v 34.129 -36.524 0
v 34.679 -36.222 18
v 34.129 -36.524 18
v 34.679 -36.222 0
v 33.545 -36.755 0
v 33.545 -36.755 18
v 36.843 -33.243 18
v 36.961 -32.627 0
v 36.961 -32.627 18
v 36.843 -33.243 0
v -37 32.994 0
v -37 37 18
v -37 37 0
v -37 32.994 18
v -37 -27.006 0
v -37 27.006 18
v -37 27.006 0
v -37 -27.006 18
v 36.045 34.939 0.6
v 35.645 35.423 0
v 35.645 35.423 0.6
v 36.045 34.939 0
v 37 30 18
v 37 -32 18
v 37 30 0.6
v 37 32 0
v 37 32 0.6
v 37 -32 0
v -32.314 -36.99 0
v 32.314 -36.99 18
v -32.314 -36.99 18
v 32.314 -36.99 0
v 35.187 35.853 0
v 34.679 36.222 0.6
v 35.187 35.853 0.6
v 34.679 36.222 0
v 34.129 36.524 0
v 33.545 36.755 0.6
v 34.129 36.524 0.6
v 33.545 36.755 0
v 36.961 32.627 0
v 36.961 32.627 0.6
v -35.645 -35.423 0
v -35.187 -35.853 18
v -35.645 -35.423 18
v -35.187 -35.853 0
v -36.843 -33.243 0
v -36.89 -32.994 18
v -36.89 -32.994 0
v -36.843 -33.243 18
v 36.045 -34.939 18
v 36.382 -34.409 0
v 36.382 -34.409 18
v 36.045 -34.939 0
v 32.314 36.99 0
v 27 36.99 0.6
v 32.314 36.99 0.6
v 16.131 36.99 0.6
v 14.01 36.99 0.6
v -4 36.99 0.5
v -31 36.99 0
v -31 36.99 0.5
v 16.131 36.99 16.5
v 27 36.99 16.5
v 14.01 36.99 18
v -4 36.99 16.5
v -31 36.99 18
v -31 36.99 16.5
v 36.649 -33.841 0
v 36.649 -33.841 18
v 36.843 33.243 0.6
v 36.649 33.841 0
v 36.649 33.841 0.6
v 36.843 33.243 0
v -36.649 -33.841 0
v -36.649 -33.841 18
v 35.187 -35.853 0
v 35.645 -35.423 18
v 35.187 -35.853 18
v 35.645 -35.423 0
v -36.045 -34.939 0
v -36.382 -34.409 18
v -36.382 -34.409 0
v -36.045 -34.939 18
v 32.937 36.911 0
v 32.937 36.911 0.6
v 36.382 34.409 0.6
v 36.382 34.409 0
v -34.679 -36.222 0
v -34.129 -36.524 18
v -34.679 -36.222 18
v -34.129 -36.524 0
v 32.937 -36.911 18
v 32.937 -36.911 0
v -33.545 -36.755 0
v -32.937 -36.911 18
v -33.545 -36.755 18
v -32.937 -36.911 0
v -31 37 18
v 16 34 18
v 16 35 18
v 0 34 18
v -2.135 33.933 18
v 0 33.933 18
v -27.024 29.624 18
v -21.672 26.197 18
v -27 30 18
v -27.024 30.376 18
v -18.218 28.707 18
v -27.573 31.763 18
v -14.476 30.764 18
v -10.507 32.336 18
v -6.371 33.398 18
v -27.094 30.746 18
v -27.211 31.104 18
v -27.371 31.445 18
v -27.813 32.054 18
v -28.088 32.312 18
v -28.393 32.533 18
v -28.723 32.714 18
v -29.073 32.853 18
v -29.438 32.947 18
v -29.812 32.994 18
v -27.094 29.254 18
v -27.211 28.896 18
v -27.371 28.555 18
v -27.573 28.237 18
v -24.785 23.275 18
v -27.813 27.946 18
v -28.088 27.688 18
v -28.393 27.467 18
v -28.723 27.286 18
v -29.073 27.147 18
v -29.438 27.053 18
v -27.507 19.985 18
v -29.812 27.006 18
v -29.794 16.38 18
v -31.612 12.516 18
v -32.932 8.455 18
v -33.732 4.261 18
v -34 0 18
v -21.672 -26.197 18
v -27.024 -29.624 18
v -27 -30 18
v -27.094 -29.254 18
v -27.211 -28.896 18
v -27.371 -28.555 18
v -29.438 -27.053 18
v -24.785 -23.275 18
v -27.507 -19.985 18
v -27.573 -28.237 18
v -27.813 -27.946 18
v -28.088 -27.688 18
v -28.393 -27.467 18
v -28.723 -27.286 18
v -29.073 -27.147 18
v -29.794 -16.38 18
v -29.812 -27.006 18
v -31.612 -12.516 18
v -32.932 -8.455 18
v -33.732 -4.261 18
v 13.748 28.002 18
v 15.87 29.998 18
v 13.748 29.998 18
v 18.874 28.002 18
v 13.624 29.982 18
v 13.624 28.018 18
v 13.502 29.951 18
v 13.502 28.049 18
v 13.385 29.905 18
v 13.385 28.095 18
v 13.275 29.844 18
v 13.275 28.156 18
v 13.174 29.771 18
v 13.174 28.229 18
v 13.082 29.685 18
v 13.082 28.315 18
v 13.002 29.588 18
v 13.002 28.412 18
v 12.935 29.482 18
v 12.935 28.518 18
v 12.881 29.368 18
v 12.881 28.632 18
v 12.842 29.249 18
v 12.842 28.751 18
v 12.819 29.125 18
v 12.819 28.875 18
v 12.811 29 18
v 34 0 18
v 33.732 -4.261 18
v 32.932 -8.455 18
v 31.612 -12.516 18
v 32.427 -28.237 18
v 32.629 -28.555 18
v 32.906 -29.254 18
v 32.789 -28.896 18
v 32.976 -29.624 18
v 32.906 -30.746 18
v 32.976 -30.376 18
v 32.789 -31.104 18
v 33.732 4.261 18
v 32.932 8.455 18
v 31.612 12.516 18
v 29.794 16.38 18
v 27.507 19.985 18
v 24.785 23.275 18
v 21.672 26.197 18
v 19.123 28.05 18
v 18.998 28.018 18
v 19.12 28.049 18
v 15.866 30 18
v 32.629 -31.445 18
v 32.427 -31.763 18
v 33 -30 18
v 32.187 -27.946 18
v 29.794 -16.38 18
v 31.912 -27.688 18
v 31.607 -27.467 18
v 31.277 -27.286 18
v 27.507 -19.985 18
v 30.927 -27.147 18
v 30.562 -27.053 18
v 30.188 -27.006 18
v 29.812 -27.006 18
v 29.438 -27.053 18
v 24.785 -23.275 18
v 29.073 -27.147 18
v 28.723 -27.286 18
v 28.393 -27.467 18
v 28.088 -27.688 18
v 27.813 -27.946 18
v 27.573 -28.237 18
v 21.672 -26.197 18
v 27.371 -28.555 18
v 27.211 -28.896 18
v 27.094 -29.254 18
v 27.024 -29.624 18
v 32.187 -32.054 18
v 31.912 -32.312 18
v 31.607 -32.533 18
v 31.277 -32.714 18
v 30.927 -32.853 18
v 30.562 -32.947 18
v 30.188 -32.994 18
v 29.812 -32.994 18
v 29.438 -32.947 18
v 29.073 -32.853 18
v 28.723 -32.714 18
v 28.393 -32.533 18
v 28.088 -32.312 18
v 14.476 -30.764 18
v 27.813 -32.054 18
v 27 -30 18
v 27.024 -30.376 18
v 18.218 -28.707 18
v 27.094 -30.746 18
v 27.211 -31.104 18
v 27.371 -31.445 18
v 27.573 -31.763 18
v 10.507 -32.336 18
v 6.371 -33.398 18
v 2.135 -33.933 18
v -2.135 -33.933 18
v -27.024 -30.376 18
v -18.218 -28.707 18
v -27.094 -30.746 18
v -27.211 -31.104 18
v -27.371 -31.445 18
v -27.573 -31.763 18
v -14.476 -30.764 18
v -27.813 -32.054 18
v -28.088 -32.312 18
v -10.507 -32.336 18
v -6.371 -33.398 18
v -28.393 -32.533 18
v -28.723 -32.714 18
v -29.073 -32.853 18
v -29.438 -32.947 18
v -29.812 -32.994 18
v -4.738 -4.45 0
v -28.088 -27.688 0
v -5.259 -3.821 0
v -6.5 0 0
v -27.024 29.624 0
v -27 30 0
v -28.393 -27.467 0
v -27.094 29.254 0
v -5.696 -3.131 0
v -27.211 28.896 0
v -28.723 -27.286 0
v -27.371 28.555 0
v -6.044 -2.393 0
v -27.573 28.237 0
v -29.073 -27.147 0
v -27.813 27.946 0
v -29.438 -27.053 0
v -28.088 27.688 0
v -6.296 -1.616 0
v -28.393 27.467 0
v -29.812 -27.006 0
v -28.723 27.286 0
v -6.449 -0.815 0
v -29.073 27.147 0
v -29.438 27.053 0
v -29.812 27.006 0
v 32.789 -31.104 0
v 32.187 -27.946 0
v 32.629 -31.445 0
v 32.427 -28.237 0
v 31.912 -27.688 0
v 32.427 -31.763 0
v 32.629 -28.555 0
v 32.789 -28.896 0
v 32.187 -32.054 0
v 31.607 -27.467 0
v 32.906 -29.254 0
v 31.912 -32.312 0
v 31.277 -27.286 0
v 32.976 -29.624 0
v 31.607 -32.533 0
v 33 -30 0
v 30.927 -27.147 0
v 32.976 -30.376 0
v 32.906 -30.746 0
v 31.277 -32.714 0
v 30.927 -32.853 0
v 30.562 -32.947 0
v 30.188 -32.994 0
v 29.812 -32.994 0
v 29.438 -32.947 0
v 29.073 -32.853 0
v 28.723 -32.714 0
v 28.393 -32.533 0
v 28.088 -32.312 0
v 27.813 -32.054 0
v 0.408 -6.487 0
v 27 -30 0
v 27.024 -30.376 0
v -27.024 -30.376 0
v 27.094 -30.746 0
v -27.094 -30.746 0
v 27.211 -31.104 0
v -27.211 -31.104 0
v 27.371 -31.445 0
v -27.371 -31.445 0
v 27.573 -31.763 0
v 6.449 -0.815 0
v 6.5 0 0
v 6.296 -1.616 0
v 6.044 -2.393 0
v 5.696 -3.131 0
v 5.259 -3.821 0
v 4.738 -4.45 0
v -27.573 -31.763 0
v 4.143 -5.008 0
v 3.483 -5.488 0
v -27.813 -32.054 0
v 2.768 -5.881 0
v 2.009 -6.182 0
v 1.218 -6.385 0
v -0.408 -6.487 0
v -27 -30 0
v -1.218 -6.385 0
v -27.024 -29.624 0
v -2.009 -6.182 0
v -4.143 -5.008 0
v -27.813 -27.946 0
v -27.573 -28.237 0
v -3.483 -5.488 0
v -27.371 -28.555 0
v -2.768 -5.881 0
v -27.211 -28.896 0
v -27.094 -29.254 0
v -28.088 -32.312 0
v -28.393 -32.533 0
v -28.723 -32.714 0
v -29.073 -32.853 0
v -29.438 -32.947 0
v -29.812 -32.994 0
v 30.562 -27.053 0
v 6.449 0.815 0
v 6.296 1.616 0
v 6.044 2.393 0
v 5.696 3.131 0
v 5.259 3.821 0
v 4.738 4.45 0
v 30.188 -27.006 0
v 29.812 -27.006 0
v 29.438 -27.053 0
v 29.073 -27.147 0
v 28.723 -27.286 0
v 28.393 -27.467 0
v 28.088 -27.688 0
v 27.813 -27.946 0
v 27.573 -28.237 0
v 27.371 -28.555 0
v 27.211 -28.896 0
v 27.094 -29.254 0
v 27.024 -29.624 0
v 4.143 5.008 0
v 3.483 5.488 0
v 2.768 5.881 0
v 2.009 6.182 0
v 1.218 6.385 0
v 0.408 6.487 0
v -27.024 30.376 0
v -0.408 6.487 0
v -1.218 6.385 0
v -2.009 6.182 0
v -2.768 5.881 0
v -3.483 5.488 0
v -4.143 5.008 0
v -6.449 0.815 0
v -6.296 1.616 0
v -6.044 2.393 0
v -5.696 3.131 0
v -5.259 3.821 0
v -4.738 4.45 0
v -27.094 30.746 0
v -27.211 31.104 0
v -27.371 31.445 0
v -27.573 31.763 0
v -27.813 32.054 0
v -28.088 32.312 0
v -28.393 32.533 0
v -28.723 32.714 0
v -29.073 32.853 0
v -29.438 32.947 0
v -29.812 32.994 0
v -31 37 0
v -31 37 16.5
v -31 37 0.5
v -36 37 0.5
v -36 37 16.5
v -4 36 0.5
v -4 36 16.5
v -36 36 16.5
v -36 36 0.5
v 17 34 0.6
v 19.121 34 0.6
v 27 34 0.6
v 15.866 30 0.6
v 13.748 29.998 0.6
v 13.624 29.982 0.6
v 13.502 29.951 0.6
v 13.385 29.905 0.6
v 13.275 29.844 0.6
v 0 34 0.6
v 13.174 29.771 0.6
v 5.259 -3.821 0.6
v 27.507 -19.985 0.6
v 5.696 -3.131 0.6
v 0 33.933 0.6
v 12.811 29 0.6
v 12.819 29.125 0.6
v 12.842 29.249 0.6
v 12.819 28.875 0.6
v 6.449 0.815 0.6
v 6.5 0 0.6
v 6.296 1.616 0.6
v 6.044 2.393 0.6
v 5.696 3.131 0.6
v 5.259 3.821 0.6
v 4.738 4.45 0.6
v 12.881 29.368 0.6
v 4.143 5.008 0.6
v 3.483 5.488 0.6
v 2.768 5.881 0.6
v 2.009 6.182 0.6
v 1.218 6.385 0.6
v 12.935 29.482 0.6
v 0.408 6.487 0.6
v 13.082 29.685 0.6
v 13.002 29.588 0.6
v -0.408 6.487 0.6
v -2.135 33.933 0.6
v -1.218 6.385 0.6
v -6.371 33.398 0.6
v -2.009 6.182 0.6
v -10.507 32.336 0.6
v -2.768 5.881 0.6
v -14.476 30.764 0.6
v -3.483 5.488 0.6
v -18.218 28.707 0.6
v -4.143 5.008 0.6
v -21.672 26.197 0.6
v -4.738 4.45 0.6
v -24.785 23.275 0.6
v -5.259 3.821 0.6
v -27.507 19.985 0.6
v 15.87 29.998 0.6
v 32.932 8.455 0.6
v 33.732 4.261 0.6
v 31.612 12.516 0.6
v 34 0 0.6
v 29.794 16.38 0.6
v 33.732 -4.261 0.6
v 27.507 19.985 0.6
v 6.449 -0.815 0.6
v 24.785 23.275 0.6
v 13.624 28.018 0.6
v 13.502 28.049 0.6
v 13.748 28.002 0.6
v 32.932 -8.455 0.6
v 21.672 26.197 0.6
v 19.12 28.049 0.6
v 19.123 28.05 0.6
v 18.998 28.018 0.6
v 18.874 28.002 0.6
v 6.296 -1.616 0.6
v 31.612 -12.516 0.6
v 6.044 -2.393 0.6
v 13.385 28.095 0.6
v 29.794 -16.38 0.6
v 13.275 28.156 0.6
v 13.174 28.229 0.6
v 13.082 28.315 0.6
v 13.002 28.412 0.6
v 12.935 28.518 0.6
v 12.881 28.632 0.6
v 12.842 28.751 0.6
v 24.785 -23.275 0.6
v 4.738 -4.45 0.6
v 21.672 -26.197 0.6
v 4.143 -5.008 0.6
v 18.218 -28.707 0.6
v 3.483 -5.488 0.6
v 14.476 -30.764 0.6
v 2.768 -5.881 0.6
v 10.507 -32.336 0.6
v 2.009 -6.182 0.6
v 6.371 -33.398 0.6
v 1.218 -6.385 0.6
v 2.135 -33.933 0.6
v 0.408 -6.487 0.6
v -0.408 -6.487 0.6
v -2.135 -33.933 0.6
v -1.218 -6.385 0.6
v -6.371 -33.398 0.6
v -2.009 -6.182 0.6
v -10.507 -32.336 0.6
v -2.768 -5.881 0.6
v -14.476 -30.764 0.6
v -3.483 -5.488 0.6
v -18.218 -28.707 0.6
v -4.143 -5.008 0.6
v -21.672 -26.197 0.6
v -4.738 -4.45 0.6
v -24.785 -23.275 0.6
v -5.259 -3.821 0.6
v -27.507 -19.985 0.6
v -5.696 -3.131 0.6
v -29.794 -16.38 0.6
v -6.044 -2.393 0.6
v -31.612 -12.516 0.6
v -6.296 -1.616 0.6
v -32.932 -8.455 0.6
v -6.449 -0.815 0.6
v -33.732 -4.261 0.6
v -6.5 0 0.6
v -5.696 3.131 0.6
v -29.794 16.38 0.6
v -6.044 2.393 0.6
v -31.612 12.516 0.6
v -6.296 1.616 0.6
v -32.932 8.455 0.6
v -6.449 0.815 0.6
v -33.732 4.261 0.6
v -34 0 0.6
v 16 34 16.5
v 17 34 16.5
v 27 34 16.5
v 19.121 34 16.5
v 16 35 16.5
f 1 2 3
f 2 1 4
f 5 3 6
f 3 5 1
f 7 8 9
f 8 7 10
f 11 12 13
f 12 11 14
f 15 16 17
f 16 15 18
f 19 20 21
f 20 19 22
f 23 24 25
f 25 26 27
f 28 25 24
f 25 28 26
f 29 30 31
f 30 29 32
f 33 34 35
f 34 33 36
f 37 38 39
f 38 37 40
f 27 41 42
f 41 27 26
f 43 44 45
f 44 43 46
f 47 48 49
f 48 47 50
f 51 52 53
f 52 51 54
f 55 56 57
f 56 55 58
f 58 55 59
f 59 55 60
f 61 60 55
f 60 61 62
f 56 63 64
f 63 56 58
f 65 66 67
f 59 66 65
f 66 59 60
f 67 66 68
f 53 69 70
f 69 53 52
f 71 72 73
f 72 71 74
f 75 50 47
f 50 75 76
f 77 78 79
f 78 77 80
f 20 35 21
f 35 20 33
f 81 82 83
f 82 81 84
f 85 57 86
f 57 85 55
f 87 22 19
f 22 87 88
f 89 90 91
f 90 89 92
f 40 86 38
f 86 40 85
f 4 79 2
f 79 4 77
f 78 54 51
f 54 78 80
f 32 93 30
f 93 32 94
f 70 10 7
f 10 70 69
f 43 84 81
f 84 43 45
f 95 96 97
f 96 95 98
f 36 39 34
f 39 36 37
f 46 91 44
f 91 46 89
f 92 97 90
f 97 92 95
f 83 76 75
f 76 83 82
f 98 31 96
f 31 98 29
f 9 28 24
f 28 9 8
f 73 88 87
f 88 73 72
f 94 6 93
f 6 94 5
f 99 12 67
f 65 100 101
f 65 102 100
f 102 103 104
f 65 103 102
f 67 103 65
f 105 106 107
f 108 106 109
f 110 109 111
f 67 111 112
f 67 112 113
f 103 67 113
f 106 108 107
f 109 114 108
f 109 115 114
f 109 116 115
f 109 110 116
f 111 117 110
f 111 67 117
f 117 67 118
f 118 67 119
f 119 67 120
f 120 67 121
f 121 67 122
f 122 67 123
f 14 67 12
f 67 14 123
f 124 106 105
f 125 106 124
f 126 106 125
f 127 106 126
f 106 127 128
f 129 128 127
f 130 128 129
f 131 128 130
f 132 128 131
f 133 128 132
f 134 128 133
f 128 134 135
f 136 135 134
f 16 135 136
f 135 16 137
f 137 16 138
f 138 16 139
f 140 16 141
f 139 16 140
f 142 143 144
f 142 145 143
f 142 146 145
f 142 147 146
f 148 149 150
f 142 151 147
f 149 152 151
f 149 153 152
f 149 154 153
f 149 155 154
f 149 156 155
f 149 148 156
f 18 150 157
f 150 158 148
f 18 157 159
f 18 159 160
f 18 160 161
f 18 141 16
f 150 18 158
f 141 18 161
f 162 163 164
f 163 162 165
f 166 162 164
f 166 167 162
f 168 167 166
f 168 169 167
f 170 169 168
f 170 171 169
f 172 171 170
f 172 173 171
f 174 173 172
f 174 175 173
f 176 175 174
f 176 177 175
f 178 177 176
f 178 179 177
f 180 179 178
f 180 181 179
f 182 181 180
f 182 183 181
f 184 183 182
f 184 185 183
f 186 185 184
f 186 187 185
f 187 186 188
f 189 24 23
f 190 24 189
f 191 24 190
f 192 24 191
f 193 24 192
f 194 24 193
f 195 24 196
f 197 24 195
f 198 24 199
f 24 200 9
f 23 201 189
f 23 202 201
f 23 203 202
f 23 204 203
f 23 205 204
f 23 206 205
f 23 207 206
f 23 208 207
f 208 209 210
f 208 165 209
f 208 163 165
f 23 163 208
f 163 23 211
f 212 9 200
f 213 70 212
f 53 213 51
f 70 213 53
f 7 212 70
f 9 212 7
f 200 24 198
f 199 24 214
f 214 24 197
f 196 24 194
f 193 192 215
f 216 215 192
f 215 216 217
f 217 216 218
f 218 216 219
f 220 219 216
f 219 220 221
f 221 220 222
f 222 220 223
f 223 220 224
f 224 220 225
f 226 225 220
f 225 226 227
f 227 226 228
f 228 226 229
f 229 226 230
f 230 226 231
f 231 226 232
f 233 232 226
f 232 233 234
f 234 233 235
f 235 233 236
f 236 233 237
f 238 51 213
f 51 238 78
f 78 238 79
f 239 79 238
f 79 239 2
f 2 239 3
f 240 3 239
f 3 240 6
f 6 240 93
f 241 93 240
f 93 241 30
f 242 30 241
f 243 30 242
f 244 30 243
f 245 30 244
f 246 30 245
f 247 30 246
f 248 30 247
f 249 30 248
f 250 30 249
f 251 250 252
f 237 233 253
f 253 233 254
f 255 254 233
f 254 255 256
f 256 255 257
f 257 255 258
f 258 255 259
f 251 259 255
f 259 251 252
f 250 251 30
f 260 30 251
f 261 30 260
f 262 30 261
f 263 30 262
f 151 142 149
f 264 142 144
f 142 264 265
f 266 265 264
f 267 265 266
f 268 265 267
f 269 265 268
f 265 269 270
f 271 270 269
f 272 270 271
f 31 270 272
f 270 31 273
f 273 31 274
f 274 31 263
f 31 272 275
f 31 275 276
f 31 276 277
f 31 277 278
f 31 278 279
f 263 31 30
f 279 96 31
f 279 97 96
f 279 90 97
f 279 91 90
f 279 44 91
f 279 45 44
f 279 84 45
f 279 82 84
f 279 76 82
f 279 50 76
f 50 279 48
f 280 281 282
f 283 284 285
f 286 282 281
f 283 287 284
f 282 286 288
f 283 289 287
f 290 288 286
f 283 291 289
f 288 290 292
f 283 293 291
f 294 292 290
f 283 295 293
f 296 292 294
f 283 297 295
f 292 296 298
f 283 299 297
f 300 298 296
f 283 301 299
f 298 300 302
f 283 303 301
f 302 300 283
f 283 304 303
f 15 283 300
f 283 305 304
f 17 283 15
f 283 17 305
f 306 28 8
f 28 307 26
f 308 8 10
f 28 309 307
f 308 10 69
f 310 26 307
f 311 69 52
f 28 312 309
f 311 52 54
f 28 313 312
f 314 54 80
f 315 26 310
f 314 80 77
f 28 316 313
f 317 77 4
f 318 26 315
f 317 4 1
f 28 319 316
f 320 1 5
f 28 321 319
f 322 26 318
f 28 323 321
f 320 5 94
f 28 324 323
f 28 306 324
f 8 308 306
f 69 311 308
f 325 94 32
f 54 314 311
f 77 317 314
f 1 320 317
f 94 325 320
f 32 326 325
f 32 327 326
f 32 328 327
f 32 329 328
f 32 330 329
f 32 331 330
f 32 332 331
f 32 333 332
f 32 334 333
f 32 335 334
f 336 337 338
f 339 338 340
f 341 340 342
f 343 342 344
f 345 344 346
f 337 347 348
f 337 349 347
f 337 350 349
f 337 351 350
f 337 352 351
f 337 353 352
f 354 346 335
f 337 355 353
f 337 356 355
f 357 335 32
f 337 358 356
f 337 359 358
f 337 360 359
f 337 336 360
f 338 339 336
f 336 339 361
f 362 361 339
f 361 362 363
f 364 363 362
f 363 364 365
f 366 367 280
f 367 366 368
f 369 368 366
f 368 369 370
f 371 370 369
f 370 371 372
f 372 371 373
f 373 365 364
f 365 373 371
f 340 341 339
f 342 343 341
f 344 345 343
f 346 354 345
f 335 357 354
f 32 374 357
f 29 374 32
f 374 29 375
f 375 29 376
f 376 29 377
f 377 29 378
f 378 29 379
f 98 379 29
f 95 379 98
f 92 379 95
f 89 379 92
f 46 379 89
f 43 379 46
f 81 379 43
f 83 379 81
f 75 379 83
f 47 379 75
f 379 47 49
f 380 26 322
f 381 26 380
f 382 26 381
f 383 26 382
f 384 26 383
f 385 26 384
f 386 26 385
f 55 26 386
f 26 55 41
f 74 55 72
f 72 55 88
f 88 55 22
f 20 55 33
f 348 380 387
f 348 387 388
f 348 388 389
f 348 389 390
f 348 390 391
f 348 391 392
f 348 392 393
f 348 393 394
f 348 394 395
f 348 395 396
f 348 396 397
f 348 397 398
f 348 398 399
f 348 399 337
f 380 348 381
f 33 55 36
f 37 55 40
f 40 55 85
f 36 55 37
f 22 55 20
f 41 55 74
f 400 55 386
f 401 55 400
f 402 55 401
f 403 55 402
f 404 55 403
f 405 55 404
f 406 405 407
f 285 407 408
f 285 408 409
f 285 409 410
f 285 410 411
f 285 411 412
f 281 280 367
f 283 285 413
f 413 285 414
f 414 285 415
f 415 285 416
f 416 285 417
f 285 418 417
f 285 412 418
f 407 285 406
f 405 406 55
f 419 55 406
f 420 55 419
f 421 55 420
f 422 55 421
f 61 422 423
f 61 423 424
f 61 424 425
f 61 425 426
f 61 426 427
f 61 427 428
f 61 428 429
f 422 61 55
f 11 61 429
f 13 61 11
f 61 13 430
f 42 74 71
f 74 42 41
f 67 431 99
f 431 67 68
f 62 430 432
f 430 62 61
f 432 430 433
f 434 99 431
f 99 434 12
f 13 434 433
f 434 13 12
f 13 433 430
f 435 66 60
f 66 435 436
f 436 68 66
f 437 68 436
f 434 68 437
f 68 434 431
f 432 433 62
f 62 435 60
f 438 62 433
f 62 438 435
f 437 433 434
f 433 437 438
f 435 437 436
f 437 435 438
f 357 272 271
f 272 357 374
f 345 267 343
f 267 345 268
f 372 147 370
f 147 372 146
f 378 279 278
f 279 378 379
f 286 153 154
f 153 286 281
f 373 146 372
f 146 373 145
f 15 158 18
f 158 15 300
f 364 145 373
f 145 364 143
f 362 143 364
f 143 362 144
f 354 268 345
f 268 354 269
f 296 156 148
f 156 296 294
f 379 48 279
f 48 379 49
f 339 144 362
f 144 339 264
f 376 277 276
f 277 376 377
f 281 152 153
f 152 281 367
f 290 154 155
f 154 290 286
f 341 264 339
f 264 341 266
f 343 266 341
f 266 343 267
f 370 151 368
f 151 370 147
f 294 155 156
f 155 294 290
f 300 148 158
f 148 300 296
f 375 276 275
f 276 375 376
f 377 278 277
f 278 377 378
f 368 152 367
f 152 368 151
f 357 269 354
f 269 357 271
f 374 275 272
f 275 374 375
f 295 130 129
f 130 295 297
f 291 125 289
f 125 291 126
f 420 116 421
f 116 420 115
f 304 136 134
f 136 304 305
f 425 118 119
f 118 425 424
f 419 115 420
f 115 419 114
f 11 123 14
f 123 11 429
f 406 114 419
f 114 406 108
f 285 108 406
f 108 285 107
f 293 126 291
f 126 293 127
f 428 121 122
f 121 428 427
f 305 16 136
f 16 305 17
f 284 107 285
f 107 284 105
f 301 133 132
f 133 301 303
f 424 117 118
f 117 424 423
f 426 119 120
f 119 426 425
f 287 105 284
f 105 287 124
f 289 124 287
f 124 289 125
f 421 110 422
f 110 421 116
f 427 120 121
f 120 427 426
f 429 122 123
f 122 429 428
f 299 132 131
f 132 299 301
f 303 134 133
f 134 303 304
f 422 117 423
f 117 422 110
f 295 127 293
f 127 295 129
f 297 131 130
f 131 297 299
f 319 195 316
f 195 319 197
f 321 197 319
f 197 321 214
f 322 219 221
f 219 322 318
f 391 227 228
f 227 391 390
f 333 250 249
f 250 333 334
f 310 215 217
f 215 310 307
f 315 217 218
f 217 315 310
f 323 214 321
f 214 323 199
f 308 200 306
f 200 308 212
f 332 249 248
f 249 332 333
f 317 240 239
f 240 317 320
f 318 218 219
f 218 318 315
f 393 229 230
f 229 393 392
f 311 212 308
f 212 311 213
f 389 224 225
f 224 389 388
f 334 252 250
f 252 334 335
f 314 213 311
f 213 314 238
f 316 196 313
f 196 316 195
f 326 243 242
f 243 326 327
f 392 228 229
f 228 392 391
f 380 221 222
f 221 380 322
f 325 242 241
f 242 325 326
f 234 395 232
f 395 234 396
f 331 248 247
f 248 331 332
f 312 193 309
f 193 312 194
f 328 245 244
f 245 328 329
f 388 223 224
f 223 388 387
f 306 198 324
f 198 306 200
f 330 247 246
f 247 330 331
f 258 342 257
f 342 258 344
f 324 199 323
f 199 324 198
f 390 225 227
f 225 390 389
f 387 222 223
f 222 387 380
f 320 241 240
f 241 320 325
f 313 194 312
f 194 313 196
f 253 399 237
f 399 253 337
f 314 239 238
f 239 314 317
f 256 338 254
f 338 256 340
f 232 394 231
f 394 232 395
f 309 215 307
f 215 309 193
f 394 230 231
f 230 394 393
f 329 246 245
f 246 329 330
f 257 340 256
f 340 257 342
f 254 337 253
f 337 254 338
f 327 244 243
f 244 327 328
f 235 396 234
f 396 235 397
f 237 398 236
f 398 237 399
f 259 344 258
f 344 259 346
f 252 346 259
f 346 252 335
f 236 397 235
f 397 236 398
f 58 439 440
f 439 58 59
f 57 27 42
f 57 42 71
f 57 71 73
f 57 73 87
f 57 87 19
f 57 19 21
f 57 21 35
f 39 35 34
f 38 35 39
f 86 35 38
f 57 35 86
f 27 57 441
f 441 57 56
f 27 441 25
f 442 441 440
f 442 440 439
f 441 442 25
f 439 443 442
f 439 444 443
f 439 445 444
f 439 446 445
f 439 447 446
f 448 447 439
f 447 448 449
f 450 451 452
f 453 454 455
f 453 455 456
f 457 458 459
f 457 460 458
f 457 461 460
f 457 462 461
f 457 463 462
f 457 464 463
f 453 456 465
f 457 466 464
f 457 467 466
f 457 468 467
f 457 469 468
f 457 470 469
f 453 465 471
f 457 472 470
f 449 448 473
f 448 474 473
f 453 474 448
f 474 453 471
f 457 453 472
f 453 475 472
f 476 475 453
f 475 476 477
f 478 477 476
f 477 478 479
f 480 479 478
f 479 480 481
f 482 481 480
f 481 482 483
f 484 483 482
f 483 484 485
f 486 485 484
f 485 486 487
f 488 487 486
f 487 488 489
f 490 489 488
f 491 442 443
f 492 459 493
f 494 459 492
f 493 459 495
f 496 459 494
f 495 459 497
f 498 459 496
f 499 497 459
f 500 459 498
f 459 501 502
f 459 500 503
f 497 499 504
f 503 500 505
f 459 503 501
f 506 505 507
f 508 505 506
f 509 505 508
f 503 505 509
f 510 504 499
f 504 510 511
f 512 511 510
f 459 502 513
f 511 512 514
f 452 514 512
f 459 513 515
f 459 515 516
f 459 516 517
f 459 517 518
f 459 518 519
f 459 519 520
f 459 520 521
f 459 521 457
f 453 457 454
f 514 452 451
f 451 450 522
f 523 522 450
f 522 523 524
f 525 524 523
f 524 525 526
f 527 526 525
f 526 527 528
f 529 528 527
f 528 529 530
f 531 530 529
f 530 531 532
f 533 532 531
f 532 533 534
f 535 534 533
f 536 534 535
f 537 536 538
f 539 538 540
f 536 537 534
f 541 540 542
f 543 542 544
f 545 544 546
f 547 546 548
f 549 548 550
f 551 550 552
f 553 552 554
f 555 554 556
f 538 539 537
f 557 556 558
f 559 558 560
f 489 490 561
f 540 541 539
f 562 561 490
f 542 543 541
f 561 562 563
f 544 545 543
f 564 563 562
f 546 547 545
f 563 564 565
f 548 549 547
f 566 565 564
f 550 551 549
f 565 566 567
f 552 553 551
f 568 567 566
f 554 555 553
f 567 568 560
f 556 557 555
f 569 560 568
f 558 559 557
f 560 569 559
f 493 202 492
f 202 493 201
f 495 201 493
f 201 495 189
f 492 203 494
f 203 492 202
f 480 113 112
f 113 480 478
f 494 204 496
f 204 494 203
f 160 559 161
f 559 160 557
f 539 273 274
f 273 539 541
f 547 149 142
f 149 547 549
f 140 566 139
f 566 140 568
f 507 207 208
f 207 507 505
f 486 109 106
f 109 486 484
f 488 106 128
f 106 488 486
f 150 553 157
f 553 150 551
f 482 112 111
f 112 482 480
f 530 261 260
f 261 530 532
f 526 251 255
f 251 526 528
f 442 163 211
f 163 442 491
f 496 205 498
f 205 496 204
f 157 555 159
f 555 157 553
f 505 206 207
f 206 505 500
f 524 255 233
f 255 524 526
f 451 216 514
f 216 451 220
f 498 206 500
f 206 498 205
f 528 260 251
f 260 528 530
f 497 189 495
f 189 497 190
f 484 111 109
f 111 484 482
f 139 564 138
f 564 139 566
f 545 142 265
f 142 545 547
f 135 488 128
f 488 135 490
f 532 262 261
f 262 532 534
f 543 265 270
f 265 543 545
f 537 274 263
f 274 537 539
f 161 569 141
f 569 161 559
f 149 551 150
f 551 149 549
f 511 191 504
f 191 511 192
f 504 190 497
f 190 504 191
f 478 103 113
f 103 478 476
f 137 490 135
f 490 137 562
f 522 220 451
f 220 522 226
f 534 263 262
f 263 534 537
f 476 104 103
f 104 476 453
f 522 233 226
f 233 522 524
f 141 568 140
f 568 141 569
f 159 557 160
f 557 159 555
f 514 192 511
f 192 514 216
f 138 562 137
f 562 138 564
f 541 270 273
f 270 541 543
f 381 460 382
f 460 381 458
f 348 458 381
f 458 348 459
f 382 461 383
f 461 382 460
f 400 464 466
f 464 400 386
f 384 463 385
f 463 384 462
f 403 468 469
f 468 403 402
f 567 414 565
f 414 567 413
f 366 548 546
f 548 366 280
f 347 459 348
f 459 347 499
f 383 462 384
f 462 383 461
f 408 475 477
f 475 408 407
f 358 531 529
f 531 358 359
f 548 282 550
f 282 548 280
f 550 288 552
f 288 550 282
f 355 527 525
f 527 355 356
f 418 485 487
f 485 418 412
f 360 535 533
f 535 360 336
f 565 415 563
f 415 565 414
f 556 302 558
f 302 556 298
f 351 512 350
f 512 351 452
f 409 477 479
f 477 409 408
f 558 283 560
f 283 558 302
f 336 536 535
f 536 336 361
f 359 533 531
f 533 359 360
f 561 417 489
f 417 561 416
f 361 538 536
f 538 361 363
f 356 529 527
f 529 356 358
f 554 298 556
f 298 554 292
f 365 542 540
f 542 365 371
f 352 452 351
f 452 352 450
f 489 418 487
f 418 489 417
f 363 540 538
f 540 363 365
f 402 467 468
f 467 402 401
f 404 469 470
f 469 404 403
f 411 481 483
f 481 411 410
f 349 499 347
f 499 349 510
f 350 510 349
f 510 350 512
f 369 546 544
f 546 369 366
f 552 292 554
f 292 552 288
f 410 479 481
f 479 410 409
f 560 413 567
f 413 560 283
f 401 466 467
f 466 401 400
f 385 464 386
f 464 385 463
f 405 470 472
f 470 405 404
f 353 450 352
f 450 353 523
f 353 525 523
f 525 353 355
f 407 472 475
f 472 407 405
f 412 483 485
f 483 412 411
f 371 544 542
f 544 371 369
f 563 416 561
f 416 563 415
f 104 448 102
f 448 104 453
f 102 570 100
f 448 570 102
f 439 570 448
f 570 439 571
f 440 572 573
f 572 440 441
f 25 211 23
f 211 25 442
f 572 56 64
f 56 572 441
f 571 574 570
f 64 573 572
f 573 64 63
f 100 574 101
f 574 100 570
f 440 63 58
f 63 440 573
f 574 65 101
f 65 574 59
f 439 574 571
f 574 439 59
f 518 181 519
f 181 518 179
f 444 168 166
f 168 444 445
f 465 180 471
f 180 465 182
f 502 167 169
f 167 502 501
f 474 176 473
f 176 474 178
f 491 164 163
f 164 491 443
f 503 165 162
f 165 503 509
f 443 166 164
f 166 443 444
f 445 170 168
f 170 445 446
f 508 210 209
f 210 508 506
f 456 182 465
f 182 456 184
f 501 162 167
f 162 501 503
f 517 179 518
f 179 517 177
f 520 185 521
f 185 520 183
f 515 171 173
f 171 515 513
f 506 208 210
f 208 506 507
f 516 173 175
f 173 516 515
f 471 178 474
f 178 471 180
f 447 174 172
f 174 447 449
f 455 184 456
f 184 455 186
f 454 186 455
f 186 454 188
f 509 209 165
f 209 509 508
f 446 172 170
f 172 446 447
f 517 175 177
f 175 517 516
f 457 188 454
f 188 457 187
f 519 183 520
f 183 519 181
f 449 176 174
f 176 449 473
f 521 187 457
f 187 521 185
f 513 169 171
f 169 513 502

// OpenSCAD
$fn = 50;


union() {
	difference() {
		union() {
			translate(v = [0, 0, 0]) {
				rotate(a = [0, 0, 0]) {
					hull() {
						translate(v = [-32.0000000000, 32.0000000000, 0]) {
							rotate(a = [0, 0, 0]) {
								translate(v = [0, 0, 0]) {
									rotate(a = [0, 0, 0]) {
										cylinder(h = 18, r = 5);
									}
								}
							}
						}
						translate(v = [32.0000000000, 32.0000000000, 0]) {
							rotate(a = [0, 0, 0]) {
								translate(v = [0, 0, 0]) {
									rotate(a = [0, 0, 0]) {
										cylinder(h = 18, r = 5);
									}
								}
							}
						}
						translate(v = [-32.0000000000, -32.0000000000, 0]) {
							rotate(a = [0, 0, 0]) {
								translate(v = [0, 0, 0]) {
									rotate(a = [0, 0, 0]) {
										cylinder(h = 18, r = 5);
									}
								}
							}
						}
						translate(v = [32.0000000000, -32.0000000000, 0]) {
							rotate(a = [0, 0, 0]) {
								translate(v = [0, 0, 0]) {
									rotate(a = [0, 0, 0]) {
										cylinder(h = 18, r = 5);
									}
								}
							}
						}
					}
				}
			}
			translate(v = [-37.0000000000, 31.0000000000, 0]) {
				rotate(a = [0, 0, 0]) {
					cube(size = [6, 6, 18]);
				}
			}
		}
		union() {
			#translate(v = [-36.0000000000, 36.0000000000, 0.5000000000]) {
				rotate(a = [0, 0, 0]) {
					cube(size = [32, 1, 16]);
				}
			}
			translate(v = [-37.5000000000, -30.0000000000, -125]) {
				rotate(a = [0, 0, 0]) {
					hull() {
						translate(v = [7.5000000000, 0, 0]) {
							rotate(a = [0, 0, 0]) {
								translate(v = [0, 0, 0]) {
									rotate(a = [0, 0, 0]) {
										cylinder(h = 250, r = 3.0000000000);
									}
								}
							}
						}
						translate(v = [-7.5000000000, 0, 0]) {
							rotate(a = [0, 0, 0]) {
								translate(v = [0, 0, 0]) {
									rotate(a = [0, 0, 0]) {
										cylinder(h = 250, r = 3.0000000000);
									}
								}
							}
						}
					}
				}
			}
			translate(v = [-37.5000000000, 30.0000000000, -125]) {
				rotate(a = [0, 0, 0]) {
					hull() {
						translate(v = [7.5000000000, 0, 0]) {
							rotate(a = [0, 0, 0]) {
								translate(v = [0, 0, 0]) {
									rotate(a = [0, 0, 0]) {
										cylinder(h = 250, r = 3.0000000000);
									}
								}
							}
						}
						translate(v = [-7.5000000000, 0, 0]) {
							rotate(a = [0, 0, 0]) {
								translate(v = [0, 0, 0]) {
									rotate(a = [0, 0, 0]) {
										cylinder(h = 250, r = 3.0000000000);
									}
								}
							}
						}
					}
				}
			}
			translate(v = [30.0000000000, -30.0000000000, -125.0000000000]) {
				rotate(a = [0, 0, 0]) {
					cylinder(h = 250, r = 3.0000000000);
				}
			}
			translate(v = [0, 0, 0.6000000000]) {
				rotate(a = [0, 0, 0]) {
					cylinder(h = 20.4000000000, r = 34.0000000000);
				}
			}
			translate(v = [0, 0, -9.0000000000]) {
				rotate(a = [0, 0, 0]) {
					cylinder(h = 18, r = 6.5000000000);
				}
			}
			translate(v = [0.0000000000, 30.0000000000, 0.6000000000]) {
				rotate(a = [0, 0, 0]) {
					cube(size = [37.0000000000, 4, 20.4000000000]);
				}
			}
			translate(v = [27.0000000000, 30.0000000000, 0.6000000000]) {
				rotate(a = [0, 0, 0]) {
					cube(size = [10, 7, 20.4000000000]);
				}
			}
			translate(v = [16.0000000000, 30.0000000000, 16.5000000000]) {
				rotate(a = [0, 0, 0]) {
					cube(size = [21, 7, 1.5000000000]);
				}
			}
			translate(v = [13.2500000000, 37.7500000000, 0.6000000000]) {
				rotate(a = [0, 0, -45]) {
					cube(size = [7.5000000000, 1.5000000000, 20.4000000000]);
				}
			}
			translate(v = [7.0610000000, 28.0000000000, 0.6000000000]) {
				rotate(a = [0, 0, 0]) {
					cube(size = [7.5000000000, 2, 17.4000000000]);
				}
			}
		}
	}
	union() {
		translate(v = [16.3110000000, 29.0000000000, 0]) {
			rotate(a = [0, 0, 0]) {
				hull() {
					translate(v = [2.5000000000, 0, 0]) {
						rotate(a = [0, 0, 0]) {
							#translate(v = [0, 0, 0]) {
								rotate(a = [0, 0, 0]) {
									cylinder(h = 18, r = 1.0000000000);
								}
							}
						}
					}
					translate(v = [-2.5000000000, 0, 0]) {
						rotate(a = [0, 0, 0]) {
							#translate(v = [0, 0, 0]) {
								rotate(a = [0, 0, 0]) {
									cylinder(h = 18, r = 1.0000000000);
								}
							}
						}
					}
				}
			}
		}
	}
}
